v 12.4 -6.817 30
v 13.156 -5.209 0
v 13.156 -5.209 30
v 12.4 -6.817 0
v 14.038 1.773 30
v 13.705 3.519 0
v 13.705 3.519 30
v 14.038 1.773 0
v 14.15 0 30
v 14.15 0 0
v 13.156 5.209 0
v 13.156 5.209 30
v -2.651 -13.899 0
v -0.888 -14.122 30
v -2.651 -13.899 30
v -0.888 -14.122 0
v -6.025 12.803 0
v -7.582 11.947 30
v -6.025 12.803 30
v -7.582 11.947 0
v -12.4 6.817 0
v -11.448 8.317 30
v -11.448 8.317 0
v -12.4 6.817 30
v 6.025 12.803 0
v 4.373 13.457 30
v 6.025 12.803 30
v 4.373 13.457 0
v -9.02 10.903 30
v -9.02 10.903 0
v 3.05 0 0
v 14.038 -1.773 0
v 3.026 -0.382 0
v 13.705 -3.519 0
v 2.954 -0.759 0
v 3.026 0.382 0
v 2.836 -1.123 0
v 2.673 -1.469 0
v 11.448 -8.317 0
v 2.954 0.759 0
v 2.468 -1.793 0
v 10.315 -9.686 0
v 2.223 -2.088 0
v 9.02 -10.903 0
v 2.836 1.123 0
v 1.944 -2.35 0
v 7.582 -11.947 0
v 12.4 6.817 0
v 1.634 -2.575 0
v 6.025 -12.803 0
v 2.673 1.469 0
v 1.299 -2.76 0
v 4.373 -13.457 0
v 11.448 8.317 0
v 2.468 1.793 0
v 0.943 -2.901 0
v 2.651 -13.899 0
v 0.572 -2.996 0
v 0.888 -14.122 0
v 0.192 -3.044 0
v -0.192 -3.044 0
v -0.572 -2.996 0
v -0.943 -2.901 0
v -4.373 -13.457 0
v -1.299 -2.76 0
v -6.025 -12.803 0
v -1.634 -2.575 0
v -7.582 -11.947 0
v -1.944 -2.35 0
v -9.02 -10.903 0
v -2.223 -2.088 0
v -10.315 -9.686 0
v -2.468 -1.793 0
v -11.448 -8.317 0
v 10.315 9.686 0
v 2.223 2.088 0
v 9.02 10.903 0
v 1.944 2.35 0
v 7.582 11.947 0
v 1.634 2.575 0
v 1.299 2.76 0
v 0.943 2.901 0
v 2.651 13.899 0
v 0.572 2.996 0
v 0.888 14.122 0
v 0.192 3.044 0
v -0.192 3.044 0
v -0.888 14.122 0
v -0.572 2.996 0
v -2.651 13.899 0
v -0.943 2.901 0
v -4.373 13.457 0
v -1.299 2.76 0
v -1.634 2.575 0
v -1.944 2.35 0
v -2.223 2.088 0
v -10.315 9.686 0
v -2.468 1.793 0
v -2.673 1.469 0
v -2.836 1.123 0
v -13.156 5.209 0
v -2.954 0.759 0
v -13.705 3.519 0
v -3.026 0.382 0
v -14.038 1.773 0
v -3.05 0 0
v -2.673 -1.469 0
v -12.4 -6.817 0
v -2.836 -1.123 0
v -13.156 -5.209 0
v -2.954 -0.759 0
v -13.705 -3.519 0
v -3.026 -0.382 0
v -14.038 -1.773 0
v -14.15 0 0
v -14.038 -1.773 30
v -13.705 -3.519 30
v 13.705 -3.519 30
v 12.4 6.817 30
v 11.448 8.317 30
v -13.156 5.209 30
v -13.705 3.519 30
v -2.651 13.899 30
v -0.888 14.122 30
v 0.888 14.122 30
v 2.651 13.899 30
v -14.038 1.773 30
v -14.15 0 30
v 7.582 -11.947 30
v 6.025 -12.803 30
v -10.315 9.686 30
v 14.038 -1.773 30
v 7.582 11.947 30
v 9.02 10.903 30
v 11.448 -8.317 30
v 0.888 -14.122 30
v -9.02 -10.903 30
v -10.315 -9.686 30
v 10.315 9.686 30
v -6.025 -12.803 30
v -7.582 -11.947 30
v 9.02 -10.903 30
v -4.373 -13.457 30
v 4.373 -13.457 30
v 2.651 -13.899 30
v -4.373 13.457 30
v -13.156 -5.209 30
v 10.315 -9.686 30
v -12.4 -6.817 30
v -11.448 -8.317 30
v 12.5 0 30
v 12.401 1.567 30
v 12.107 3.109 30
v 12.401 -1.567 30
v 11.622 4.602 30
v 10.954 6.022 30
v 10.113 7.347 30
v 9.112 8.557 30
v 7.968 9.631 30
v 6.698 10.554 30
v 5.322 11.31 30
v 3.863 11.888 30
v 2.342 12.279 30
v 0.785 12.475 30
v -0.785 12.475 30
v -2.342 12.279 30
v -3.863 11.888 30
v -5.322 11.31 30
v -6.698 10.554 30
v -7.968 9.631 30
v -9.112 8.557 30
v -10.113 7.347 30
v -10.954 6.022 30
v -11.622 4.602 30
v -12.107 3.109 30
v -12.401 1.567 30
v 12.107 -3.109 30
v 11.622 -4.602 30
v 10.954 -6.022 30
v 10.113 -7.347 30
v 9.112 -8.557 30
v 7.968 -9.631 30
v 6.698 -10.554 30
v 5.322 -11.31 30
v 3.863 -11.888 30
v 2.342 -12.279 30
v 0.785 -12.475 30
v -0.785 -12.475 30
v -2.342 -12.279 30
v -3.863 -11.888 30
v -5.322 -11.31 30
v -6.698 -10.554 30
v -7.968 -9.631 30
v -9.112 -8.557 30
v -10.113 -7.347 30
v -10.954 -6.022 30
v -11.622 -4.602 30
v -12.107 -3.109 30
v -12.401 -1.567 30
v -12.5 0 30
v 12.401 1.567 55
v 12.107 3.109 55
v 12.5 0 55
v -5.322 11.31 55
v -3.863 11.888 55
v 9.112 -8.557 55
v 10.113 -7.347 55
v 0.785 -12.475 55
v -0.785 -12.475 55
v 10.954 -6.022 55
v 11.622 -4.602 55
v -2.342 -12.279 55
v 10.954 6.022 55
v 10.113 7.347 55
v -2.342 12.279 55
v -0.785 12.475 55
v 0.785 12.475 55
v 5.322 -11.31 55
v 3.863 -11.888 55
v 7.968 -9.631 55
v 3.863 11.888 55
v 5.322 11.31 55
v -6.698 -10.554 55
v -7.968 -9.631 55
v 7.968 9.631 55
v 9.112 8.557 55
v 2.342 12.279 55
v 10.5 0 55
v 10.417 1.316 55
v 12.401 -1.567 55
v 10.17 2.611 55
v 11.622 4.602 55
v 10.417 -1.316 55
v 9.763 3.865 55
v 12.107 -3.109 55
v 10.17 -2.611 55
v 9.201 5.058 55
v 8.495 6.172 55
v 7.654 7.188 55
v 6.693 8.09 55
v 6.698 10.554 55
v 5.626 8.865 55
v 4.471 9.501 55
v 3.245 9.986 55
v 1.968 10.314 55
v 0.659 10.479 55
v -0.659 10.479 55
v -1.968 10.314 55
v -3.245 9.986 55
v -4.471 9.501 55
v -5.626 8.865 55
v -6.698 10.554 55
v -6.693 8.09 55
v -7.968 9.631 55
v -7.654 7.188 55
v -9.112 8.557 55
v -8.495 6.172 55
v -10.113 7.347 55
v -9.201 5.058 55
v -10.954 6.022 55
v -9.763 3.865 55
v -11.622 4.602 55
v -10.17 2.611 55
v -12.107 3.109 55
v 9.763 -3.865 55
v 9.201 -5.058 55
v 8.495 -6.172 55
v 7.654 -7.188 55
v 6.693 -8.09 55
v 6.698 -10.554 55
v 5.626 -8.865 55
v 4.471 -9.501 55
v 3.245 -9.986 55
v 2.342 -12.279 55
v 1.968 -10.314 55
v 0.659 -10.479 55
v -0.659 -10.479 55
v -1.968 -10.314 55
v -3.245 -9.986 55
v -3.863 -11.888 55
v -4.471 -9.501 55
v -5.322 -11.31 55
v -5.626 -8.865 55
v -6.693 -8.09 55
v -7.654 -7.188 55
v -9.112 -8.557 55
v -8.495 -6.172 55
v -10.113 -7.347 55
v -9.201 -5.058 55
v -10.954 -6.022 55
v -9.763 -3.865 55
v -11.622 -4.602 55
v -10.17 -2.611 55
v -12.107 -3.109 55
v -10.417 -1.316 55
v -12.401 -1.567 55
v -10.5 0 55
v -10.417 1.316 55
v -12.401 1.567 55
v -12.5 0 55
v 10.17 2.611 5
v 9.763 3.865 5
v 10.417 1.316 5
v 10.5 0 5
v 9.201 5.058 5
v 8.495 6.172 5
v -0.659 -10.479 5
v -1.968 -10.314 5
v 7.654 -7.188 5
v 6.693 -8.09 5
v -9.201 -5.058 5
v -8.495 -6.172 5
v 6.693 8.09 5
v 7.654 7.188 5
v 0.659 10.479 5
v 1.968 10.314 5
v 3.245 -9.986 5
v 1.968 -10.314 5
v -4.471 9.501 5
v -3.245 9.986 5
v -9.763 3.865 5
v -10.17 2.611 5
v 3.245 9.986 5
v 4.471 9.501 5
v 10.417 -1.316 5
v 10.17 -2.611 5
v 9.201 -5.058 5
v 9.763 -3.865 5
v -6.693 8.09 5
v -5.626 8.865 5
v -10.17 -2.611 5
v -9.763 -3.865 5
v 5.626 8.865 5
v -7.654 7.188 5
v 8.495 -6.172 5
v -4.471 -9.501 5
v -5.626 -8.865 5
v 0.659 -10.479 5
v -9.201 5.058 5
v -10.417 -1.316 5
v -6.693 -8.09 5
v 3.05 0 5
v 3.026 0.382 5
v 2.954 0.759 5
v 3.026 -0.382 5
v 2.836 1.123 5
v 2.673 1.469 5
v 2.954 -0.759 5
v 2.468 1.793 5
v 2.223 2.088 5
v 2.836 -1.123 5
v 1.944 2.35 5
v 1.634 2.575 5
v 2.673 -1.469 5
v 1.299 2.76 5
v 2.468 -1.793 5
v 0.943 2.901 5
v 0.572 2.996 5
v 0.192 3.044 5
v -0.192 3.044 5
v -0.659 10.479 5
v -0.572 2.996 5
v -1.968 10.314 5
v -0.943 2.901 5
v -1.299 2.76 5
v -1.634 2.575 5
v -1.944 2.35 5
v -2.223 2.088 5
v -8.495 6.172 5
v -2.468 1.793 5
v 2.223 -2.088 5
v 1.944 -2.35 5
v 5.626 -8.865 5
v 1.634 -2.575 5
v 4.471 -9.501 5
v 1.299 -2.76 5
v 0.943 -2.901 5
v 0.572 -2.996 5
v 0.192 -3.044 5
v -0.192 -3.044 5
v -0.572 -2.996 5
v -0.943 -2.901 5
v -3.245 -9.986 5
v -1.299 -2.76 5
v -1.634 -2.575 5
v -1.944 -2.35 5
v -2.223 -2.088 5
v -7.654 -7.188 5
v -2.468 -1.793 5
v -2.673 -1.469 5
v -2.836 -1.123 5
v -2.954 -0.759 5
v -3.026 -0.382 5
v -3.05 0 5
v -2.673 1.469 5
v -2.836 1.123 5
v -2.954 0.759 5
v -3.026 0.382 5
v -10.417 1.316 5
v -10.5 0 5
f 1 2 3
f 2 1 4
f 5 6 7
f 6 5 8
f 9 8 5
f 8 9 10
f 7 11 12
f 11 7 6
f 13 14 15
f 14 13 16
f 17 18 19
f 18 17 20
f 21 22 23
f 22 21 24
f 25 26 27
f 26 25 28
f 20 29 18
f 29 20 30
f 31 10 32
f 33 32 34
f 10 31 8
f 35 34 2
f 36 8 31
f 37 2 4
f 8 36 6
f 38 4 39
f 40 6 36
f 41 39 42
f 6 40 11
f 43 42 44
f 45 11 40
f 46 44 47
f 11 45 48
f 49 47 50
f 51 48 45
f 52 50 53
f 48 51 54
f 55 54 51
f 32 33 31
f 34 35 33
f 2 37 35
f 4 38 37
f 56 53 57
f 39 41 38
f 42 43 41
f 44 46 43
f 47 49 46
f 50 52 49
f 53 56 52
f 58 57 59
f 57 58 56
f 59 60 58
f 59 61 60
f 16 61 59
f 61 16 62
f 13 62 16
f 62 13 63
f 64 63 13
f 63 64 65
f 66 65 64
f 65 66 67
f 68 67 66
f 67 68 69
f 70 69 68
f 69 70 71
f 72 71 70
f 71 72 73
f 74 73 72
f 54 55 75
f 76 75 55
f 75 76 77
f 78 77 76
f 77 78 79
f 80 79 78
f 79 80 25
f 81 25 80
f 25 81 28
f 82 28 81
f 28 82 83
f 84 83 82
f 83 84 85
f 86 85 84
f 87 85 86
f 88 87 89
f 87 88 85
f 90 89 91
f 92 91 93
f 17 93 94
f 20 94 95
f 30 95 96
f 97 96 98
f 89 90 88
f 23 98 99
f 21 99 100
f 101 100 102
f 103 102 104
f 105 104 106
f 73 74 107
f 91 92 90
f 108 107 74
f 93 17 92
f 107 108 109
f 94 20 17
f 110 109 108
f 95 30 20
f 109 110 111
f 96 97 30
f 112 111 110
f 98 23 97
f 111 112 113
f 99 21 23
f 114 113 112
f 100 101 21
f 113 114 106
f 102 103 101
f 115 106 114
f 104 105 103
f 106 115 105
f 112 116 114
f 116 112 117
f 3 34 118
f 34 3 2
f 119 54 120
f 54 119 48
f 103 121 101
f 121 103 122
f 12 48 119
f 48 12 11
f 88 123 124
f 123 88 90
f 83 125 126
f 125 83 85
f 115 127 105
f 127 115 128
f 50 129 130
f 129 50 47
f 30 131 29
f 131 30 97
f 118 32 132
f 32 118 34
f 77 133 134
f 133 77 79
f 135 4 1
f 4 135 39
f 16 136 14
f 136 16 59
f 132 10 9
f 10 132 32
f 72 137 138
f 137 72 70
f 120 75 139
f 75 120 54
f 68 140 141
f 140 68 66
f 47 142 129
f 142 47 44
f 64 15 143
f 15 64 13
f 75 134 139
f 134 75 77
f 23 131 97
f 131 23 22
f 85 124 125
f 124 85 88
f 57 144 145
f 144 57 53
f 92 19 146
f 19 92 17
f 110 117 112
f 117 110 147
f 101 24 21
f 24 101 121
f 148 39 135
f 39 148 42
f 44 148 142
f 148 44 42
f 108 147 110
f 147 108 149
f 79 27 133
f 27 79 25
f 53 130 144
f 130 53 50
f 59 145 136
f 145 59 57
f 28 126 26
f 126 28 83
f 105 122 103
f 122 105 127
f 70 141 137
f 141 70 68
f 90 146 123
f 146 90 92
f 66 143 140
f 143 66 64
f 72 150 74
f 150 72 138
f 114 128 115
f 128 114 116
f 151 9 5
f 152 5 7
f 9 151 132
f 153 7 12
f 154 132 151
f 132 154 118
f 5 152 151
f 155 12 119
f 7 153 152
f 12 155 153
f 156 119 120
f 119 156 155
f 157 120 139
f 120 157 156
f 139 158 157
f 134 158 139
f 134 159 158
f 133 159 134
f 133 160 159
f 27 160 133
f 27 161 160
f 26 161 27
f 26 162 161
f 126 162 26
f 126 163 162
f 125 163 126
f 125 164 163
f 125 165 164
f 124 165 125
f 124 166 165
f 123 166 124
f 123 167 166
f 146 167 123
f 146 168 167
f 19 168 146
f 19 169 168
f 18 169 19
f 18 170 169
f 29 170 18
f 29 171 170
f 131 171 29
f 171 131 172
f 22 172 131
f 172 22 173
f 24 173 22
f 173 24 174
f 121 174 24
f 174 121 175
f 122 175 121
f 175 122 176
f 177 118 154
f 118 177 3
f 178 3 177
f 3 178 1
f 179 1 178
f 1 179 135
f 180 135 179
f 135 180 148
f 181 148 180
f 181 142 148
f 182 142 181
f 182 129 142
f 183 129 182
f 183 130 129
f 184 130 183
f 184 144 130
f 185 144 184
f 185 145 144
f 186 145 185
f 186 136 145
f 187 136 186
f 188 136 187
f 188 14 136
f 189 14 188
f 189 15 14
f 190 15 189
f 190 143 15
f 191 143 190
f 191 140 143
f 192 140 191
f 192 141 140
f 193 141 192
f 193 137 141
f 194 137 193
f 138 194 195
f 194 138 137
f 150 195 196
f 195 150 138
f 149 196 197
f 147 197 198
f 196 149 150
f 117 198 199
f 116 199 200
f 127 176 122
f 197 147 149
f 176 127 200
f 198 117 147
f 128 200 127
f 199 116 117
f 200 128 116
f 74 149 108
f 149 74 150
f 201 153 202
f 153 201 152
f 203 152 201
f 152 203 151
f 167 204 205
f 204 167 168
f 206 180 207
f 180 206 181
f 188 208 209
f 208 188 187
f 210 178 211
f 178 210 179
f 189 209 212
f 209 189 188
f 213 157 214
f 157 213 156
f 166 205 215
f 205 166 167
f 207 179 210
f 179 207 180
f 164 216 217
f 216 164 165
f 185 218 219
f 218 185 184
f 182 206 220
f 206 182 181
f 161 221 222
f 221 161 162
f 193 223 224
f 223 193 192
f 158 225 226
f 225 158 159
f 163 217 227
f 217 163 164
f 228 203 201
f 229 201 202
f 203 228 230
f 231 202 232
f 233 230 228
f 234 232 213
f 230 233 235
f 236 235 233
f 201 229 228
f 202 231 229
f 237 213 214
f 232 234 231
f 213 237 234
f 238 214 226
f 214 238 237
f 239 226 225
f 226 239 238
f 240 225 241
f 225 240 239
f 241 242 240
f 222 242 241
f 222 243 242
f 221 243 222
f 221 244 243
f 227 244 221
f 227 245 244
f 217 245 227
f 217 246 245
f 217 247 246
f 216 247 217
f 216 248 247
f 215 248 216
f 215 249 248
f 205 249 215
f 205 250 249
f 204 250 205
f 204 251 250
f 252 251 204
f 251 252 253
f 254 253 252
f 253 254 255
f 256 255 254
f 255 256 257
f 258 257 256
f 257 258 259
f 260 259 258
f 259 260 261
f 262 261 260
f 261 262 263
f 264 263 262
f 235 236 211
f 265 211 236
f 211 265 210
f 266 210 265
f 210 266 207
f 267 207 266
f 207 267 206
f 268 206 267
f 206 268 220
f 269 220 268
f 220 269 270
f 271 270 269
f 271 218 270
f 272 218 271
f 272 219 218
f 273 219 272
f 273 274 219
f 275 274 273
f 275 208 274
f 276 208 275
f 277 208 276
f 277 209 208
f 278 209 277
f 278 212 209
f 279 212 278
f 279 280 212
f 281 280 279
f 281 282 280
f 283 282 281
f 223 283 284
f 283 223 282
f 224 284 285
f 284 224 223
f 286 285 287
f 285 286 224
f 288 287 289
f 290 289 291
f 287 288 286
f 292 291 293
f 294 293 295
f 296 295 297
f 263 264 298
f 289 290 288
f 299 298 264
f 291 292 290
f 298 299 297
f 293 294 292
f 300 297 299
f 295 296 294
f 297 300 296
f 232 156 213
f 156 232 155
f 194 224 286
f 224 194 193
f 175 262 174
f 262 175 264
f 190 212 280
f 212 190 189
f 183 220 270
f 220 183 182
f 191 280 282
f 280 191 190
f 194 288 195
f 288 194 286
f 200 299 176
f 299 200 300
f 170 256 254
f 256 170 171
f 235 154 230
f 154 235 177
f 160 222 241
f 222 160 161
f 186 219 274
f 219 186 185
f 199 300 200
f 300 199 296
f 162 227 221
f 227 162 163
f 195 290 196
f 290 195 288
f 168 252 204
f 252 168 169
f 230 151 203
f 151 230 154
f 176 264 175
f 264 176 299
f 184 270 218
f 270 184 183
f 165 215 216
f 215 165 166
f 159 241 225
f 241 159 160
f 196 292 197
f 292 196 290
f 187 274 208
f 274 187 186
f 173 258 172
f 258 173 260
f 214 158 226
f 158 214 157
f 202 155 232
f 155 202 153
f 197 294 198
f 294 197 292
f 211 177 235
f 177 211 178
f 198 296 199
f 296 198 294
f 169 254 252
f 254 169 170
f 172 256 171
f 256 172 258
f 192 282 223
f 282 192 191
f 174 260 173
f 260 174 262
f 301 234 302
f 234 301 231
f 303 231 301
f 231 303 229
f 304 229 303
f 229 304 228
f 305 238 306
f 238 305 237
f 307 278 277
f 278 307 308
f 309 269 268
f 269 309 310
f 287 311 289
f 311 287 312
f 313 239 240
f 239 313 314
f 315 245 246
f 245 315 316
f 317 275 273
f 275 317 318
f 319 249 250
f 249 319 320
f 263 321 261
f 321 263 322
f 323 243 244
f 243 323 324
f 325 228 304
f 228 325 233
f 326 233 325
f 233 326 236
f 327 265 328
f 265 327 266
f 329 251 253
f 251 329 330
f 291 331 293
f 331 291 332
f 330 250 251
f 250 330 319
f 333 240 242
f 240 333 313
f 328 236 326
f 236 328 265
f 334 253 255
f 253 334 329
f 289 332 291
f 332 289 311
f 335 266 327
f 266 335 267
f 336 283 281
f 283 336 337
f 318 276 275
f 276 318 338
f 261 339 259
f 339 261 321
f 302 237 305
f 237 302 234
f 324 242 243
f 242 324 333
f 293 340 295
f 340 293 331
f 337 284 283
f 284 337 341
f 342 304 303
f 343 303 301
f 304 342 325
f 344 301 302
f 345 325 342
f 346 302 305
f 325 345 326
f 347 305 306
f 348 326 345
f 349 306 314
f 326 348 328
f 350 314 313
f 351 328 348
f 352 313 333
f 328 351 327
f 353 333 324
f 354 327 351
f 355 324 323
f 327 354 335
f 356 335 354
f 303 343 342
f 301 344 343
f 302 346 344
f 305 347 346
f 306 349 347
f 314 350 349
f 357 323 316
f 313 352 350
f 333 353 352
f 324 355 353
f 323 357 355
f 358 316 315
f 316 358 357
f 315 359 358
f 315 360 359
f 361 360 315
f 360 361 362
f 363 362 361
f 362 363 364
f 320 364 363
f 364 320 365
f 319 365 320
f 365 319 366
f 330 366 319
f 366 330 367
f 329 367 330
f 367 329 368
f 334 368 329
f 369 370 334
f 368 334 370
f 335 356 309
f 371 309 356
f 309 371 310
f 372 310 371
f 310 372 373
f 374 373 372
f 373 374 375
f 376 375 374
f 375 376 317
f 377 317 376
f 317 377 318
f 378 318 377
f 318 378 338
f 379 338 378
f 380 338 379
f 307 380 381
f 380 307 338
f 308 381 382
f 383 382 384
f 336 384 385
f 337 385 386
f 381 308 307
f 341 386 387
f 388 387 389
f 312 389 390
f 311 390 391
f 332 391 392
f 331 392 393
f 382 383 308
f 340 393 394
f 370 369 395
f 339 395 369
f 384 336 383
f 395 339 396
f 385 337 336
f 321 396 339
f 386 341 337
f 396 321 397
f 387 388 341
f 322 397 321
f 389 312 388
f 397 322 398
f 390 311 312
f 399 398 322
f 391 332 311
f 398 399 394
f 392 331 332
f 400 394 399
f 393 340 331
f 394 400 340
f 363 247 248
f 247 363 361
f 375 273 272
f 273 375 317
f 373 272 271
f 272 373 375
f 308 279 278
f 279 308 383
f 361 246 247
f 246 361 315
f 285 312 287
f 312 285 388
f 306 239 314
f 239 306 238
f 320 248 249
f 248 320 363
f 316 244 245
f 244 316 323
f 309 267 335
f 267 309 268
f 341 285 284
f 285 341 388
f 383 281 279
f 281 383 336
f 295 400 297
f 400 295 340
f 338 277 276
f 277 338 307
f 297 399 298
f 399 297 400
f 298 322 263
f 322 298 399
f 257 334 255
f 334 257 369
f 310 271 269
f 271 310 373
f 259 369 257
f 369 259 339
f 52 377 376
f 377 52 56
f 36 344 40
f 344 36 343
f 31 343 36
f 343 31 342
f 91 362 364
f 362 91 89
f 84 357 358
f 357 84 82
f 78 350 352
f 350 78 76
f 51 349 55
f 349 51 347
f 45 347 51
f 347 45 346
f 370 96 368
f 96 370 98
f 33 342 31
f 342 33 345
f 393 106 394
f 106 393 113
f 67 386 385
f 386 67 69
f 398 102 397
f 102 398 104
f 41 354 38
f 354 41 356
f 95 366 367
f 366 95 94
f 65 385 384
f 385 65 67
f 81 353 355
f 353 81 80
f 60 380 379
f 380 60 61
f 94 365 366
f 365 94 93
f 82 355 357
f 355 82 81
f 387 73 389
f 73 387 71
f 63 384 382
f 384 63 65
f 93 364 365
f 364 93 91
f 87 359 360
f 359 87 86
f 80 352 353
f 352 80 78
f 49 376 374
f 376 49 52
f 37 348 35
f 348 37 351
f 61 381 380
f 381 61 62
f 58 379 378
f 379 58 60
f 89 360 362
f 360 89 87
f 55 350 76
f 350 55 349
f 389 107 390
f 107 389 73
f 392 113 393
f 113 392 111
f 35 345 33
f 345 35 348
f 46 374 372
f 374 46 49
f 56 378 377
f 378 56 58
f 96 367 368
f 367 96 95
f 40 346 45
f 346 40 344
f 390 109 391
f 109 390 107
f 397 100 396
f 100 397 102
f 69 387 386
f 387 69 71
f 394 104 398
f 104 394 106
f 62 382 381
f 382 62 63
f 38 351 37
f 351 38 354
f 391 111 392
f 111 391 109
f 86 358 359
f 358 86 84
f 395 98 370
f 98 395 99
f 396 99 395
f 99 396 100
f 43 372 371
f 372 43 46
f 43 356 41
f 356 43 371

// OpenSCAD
$fn=50;

wallThck=2;
fudge=0.1;

difference(){
  union(){
    cylinder(d=28.3,h=30);
    translate([0,0,30]) cylinder(d=25,h=25);
  }
  translate([0,0,5]) cylinder(d=25-4,h=30+25);
  translate([0,0,-fudge/2]) cylinder(d=6.1,h=5+fudge);
}
